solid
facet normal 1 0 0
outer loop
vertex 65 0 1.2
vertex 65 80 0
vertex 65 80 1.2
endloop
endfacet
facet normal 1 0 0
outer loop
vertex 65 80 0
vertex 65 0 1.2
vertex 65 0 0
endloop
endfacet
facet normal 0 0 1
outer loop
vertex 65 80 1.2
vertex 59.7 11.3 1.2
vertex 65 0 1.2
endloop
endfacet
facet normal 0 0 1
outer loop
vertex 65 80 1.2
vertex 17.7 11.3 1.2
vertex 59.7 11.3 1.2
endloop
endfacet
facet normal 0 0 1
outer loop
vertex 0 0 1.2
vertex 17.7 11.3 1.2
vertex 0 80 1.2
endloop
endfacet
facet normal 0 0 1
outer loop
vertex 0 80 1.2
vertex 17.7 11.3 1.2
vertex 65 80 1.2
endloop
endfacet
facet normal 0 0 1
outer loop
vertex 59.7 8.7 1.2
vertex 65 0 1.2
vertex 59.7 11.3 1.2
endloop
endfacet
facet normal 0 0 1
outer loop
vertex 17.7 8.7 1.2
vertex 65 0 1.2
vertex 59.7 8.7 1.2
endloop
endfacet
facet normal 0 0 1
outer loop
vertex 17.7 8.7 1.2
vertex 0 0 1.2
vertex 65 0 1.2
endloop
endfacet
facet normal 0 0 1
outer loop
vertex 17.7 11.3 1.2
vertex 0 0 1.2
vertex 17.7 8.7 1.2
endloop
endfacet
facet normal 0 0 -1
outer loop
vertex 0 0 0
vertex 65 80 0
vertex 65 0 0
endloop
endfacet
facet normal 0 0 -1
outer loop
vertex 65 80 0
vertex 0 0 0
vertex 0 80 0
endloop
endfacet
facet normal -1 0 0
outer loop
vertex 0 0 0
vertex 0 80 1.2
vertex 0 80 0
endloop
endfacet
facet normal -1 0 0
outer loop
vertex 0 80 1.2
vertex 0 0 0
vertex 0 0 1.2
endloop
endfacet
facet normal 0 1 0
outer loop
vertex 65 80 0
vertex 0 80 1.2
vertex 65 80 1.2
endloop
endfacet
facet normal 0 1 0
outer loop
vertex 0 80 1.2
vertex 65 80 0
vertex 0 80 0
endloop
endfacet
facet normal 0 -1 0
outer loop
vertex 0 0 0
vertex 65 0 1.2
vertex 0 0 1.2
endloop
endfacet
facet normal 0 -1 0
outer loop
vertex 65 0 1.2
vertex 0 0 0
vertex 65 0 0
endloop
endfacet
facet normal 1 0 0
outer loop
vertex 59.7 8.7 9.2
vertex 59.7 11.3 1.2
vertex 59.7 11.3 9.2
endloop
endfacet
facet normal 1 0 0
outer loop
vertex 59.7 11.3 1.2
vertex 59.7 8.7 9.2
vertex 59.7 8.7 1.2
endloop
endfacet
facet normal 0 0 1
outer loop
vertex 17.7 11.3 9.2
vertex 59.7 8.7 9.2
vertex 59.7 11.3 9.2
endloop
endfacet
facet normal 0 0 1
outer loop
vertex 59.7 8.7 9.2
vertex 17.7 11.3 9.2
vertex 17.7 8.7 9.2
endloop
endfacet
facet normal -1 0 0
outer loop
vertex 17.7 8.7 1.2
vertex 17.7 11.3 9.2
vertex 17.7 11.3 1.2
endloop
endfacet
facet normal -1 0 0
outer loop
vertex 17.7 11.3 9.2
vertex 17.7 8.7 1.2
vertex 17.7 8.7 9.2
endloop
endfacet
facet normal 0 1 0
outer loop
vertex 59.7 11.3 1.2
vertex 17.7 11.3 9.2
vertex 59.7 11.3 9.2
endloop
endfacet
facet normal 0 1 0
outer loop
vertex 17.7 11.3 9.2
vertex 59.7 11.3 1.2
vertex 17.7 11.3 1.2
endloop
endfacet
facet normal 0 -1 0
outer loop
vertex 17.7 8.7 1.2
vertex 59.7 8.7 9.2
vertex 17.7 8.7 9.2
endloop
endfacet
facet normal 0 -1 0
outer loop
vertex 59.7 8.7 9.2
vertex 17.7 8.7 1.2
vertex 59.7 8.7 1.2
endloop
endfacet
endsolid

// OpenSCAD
cube([65,80,1.2]);

translate([19, 10, 1.2])
    translate([-1.3, -1.3, 0])
        cube([42, 2.6, 8]);
